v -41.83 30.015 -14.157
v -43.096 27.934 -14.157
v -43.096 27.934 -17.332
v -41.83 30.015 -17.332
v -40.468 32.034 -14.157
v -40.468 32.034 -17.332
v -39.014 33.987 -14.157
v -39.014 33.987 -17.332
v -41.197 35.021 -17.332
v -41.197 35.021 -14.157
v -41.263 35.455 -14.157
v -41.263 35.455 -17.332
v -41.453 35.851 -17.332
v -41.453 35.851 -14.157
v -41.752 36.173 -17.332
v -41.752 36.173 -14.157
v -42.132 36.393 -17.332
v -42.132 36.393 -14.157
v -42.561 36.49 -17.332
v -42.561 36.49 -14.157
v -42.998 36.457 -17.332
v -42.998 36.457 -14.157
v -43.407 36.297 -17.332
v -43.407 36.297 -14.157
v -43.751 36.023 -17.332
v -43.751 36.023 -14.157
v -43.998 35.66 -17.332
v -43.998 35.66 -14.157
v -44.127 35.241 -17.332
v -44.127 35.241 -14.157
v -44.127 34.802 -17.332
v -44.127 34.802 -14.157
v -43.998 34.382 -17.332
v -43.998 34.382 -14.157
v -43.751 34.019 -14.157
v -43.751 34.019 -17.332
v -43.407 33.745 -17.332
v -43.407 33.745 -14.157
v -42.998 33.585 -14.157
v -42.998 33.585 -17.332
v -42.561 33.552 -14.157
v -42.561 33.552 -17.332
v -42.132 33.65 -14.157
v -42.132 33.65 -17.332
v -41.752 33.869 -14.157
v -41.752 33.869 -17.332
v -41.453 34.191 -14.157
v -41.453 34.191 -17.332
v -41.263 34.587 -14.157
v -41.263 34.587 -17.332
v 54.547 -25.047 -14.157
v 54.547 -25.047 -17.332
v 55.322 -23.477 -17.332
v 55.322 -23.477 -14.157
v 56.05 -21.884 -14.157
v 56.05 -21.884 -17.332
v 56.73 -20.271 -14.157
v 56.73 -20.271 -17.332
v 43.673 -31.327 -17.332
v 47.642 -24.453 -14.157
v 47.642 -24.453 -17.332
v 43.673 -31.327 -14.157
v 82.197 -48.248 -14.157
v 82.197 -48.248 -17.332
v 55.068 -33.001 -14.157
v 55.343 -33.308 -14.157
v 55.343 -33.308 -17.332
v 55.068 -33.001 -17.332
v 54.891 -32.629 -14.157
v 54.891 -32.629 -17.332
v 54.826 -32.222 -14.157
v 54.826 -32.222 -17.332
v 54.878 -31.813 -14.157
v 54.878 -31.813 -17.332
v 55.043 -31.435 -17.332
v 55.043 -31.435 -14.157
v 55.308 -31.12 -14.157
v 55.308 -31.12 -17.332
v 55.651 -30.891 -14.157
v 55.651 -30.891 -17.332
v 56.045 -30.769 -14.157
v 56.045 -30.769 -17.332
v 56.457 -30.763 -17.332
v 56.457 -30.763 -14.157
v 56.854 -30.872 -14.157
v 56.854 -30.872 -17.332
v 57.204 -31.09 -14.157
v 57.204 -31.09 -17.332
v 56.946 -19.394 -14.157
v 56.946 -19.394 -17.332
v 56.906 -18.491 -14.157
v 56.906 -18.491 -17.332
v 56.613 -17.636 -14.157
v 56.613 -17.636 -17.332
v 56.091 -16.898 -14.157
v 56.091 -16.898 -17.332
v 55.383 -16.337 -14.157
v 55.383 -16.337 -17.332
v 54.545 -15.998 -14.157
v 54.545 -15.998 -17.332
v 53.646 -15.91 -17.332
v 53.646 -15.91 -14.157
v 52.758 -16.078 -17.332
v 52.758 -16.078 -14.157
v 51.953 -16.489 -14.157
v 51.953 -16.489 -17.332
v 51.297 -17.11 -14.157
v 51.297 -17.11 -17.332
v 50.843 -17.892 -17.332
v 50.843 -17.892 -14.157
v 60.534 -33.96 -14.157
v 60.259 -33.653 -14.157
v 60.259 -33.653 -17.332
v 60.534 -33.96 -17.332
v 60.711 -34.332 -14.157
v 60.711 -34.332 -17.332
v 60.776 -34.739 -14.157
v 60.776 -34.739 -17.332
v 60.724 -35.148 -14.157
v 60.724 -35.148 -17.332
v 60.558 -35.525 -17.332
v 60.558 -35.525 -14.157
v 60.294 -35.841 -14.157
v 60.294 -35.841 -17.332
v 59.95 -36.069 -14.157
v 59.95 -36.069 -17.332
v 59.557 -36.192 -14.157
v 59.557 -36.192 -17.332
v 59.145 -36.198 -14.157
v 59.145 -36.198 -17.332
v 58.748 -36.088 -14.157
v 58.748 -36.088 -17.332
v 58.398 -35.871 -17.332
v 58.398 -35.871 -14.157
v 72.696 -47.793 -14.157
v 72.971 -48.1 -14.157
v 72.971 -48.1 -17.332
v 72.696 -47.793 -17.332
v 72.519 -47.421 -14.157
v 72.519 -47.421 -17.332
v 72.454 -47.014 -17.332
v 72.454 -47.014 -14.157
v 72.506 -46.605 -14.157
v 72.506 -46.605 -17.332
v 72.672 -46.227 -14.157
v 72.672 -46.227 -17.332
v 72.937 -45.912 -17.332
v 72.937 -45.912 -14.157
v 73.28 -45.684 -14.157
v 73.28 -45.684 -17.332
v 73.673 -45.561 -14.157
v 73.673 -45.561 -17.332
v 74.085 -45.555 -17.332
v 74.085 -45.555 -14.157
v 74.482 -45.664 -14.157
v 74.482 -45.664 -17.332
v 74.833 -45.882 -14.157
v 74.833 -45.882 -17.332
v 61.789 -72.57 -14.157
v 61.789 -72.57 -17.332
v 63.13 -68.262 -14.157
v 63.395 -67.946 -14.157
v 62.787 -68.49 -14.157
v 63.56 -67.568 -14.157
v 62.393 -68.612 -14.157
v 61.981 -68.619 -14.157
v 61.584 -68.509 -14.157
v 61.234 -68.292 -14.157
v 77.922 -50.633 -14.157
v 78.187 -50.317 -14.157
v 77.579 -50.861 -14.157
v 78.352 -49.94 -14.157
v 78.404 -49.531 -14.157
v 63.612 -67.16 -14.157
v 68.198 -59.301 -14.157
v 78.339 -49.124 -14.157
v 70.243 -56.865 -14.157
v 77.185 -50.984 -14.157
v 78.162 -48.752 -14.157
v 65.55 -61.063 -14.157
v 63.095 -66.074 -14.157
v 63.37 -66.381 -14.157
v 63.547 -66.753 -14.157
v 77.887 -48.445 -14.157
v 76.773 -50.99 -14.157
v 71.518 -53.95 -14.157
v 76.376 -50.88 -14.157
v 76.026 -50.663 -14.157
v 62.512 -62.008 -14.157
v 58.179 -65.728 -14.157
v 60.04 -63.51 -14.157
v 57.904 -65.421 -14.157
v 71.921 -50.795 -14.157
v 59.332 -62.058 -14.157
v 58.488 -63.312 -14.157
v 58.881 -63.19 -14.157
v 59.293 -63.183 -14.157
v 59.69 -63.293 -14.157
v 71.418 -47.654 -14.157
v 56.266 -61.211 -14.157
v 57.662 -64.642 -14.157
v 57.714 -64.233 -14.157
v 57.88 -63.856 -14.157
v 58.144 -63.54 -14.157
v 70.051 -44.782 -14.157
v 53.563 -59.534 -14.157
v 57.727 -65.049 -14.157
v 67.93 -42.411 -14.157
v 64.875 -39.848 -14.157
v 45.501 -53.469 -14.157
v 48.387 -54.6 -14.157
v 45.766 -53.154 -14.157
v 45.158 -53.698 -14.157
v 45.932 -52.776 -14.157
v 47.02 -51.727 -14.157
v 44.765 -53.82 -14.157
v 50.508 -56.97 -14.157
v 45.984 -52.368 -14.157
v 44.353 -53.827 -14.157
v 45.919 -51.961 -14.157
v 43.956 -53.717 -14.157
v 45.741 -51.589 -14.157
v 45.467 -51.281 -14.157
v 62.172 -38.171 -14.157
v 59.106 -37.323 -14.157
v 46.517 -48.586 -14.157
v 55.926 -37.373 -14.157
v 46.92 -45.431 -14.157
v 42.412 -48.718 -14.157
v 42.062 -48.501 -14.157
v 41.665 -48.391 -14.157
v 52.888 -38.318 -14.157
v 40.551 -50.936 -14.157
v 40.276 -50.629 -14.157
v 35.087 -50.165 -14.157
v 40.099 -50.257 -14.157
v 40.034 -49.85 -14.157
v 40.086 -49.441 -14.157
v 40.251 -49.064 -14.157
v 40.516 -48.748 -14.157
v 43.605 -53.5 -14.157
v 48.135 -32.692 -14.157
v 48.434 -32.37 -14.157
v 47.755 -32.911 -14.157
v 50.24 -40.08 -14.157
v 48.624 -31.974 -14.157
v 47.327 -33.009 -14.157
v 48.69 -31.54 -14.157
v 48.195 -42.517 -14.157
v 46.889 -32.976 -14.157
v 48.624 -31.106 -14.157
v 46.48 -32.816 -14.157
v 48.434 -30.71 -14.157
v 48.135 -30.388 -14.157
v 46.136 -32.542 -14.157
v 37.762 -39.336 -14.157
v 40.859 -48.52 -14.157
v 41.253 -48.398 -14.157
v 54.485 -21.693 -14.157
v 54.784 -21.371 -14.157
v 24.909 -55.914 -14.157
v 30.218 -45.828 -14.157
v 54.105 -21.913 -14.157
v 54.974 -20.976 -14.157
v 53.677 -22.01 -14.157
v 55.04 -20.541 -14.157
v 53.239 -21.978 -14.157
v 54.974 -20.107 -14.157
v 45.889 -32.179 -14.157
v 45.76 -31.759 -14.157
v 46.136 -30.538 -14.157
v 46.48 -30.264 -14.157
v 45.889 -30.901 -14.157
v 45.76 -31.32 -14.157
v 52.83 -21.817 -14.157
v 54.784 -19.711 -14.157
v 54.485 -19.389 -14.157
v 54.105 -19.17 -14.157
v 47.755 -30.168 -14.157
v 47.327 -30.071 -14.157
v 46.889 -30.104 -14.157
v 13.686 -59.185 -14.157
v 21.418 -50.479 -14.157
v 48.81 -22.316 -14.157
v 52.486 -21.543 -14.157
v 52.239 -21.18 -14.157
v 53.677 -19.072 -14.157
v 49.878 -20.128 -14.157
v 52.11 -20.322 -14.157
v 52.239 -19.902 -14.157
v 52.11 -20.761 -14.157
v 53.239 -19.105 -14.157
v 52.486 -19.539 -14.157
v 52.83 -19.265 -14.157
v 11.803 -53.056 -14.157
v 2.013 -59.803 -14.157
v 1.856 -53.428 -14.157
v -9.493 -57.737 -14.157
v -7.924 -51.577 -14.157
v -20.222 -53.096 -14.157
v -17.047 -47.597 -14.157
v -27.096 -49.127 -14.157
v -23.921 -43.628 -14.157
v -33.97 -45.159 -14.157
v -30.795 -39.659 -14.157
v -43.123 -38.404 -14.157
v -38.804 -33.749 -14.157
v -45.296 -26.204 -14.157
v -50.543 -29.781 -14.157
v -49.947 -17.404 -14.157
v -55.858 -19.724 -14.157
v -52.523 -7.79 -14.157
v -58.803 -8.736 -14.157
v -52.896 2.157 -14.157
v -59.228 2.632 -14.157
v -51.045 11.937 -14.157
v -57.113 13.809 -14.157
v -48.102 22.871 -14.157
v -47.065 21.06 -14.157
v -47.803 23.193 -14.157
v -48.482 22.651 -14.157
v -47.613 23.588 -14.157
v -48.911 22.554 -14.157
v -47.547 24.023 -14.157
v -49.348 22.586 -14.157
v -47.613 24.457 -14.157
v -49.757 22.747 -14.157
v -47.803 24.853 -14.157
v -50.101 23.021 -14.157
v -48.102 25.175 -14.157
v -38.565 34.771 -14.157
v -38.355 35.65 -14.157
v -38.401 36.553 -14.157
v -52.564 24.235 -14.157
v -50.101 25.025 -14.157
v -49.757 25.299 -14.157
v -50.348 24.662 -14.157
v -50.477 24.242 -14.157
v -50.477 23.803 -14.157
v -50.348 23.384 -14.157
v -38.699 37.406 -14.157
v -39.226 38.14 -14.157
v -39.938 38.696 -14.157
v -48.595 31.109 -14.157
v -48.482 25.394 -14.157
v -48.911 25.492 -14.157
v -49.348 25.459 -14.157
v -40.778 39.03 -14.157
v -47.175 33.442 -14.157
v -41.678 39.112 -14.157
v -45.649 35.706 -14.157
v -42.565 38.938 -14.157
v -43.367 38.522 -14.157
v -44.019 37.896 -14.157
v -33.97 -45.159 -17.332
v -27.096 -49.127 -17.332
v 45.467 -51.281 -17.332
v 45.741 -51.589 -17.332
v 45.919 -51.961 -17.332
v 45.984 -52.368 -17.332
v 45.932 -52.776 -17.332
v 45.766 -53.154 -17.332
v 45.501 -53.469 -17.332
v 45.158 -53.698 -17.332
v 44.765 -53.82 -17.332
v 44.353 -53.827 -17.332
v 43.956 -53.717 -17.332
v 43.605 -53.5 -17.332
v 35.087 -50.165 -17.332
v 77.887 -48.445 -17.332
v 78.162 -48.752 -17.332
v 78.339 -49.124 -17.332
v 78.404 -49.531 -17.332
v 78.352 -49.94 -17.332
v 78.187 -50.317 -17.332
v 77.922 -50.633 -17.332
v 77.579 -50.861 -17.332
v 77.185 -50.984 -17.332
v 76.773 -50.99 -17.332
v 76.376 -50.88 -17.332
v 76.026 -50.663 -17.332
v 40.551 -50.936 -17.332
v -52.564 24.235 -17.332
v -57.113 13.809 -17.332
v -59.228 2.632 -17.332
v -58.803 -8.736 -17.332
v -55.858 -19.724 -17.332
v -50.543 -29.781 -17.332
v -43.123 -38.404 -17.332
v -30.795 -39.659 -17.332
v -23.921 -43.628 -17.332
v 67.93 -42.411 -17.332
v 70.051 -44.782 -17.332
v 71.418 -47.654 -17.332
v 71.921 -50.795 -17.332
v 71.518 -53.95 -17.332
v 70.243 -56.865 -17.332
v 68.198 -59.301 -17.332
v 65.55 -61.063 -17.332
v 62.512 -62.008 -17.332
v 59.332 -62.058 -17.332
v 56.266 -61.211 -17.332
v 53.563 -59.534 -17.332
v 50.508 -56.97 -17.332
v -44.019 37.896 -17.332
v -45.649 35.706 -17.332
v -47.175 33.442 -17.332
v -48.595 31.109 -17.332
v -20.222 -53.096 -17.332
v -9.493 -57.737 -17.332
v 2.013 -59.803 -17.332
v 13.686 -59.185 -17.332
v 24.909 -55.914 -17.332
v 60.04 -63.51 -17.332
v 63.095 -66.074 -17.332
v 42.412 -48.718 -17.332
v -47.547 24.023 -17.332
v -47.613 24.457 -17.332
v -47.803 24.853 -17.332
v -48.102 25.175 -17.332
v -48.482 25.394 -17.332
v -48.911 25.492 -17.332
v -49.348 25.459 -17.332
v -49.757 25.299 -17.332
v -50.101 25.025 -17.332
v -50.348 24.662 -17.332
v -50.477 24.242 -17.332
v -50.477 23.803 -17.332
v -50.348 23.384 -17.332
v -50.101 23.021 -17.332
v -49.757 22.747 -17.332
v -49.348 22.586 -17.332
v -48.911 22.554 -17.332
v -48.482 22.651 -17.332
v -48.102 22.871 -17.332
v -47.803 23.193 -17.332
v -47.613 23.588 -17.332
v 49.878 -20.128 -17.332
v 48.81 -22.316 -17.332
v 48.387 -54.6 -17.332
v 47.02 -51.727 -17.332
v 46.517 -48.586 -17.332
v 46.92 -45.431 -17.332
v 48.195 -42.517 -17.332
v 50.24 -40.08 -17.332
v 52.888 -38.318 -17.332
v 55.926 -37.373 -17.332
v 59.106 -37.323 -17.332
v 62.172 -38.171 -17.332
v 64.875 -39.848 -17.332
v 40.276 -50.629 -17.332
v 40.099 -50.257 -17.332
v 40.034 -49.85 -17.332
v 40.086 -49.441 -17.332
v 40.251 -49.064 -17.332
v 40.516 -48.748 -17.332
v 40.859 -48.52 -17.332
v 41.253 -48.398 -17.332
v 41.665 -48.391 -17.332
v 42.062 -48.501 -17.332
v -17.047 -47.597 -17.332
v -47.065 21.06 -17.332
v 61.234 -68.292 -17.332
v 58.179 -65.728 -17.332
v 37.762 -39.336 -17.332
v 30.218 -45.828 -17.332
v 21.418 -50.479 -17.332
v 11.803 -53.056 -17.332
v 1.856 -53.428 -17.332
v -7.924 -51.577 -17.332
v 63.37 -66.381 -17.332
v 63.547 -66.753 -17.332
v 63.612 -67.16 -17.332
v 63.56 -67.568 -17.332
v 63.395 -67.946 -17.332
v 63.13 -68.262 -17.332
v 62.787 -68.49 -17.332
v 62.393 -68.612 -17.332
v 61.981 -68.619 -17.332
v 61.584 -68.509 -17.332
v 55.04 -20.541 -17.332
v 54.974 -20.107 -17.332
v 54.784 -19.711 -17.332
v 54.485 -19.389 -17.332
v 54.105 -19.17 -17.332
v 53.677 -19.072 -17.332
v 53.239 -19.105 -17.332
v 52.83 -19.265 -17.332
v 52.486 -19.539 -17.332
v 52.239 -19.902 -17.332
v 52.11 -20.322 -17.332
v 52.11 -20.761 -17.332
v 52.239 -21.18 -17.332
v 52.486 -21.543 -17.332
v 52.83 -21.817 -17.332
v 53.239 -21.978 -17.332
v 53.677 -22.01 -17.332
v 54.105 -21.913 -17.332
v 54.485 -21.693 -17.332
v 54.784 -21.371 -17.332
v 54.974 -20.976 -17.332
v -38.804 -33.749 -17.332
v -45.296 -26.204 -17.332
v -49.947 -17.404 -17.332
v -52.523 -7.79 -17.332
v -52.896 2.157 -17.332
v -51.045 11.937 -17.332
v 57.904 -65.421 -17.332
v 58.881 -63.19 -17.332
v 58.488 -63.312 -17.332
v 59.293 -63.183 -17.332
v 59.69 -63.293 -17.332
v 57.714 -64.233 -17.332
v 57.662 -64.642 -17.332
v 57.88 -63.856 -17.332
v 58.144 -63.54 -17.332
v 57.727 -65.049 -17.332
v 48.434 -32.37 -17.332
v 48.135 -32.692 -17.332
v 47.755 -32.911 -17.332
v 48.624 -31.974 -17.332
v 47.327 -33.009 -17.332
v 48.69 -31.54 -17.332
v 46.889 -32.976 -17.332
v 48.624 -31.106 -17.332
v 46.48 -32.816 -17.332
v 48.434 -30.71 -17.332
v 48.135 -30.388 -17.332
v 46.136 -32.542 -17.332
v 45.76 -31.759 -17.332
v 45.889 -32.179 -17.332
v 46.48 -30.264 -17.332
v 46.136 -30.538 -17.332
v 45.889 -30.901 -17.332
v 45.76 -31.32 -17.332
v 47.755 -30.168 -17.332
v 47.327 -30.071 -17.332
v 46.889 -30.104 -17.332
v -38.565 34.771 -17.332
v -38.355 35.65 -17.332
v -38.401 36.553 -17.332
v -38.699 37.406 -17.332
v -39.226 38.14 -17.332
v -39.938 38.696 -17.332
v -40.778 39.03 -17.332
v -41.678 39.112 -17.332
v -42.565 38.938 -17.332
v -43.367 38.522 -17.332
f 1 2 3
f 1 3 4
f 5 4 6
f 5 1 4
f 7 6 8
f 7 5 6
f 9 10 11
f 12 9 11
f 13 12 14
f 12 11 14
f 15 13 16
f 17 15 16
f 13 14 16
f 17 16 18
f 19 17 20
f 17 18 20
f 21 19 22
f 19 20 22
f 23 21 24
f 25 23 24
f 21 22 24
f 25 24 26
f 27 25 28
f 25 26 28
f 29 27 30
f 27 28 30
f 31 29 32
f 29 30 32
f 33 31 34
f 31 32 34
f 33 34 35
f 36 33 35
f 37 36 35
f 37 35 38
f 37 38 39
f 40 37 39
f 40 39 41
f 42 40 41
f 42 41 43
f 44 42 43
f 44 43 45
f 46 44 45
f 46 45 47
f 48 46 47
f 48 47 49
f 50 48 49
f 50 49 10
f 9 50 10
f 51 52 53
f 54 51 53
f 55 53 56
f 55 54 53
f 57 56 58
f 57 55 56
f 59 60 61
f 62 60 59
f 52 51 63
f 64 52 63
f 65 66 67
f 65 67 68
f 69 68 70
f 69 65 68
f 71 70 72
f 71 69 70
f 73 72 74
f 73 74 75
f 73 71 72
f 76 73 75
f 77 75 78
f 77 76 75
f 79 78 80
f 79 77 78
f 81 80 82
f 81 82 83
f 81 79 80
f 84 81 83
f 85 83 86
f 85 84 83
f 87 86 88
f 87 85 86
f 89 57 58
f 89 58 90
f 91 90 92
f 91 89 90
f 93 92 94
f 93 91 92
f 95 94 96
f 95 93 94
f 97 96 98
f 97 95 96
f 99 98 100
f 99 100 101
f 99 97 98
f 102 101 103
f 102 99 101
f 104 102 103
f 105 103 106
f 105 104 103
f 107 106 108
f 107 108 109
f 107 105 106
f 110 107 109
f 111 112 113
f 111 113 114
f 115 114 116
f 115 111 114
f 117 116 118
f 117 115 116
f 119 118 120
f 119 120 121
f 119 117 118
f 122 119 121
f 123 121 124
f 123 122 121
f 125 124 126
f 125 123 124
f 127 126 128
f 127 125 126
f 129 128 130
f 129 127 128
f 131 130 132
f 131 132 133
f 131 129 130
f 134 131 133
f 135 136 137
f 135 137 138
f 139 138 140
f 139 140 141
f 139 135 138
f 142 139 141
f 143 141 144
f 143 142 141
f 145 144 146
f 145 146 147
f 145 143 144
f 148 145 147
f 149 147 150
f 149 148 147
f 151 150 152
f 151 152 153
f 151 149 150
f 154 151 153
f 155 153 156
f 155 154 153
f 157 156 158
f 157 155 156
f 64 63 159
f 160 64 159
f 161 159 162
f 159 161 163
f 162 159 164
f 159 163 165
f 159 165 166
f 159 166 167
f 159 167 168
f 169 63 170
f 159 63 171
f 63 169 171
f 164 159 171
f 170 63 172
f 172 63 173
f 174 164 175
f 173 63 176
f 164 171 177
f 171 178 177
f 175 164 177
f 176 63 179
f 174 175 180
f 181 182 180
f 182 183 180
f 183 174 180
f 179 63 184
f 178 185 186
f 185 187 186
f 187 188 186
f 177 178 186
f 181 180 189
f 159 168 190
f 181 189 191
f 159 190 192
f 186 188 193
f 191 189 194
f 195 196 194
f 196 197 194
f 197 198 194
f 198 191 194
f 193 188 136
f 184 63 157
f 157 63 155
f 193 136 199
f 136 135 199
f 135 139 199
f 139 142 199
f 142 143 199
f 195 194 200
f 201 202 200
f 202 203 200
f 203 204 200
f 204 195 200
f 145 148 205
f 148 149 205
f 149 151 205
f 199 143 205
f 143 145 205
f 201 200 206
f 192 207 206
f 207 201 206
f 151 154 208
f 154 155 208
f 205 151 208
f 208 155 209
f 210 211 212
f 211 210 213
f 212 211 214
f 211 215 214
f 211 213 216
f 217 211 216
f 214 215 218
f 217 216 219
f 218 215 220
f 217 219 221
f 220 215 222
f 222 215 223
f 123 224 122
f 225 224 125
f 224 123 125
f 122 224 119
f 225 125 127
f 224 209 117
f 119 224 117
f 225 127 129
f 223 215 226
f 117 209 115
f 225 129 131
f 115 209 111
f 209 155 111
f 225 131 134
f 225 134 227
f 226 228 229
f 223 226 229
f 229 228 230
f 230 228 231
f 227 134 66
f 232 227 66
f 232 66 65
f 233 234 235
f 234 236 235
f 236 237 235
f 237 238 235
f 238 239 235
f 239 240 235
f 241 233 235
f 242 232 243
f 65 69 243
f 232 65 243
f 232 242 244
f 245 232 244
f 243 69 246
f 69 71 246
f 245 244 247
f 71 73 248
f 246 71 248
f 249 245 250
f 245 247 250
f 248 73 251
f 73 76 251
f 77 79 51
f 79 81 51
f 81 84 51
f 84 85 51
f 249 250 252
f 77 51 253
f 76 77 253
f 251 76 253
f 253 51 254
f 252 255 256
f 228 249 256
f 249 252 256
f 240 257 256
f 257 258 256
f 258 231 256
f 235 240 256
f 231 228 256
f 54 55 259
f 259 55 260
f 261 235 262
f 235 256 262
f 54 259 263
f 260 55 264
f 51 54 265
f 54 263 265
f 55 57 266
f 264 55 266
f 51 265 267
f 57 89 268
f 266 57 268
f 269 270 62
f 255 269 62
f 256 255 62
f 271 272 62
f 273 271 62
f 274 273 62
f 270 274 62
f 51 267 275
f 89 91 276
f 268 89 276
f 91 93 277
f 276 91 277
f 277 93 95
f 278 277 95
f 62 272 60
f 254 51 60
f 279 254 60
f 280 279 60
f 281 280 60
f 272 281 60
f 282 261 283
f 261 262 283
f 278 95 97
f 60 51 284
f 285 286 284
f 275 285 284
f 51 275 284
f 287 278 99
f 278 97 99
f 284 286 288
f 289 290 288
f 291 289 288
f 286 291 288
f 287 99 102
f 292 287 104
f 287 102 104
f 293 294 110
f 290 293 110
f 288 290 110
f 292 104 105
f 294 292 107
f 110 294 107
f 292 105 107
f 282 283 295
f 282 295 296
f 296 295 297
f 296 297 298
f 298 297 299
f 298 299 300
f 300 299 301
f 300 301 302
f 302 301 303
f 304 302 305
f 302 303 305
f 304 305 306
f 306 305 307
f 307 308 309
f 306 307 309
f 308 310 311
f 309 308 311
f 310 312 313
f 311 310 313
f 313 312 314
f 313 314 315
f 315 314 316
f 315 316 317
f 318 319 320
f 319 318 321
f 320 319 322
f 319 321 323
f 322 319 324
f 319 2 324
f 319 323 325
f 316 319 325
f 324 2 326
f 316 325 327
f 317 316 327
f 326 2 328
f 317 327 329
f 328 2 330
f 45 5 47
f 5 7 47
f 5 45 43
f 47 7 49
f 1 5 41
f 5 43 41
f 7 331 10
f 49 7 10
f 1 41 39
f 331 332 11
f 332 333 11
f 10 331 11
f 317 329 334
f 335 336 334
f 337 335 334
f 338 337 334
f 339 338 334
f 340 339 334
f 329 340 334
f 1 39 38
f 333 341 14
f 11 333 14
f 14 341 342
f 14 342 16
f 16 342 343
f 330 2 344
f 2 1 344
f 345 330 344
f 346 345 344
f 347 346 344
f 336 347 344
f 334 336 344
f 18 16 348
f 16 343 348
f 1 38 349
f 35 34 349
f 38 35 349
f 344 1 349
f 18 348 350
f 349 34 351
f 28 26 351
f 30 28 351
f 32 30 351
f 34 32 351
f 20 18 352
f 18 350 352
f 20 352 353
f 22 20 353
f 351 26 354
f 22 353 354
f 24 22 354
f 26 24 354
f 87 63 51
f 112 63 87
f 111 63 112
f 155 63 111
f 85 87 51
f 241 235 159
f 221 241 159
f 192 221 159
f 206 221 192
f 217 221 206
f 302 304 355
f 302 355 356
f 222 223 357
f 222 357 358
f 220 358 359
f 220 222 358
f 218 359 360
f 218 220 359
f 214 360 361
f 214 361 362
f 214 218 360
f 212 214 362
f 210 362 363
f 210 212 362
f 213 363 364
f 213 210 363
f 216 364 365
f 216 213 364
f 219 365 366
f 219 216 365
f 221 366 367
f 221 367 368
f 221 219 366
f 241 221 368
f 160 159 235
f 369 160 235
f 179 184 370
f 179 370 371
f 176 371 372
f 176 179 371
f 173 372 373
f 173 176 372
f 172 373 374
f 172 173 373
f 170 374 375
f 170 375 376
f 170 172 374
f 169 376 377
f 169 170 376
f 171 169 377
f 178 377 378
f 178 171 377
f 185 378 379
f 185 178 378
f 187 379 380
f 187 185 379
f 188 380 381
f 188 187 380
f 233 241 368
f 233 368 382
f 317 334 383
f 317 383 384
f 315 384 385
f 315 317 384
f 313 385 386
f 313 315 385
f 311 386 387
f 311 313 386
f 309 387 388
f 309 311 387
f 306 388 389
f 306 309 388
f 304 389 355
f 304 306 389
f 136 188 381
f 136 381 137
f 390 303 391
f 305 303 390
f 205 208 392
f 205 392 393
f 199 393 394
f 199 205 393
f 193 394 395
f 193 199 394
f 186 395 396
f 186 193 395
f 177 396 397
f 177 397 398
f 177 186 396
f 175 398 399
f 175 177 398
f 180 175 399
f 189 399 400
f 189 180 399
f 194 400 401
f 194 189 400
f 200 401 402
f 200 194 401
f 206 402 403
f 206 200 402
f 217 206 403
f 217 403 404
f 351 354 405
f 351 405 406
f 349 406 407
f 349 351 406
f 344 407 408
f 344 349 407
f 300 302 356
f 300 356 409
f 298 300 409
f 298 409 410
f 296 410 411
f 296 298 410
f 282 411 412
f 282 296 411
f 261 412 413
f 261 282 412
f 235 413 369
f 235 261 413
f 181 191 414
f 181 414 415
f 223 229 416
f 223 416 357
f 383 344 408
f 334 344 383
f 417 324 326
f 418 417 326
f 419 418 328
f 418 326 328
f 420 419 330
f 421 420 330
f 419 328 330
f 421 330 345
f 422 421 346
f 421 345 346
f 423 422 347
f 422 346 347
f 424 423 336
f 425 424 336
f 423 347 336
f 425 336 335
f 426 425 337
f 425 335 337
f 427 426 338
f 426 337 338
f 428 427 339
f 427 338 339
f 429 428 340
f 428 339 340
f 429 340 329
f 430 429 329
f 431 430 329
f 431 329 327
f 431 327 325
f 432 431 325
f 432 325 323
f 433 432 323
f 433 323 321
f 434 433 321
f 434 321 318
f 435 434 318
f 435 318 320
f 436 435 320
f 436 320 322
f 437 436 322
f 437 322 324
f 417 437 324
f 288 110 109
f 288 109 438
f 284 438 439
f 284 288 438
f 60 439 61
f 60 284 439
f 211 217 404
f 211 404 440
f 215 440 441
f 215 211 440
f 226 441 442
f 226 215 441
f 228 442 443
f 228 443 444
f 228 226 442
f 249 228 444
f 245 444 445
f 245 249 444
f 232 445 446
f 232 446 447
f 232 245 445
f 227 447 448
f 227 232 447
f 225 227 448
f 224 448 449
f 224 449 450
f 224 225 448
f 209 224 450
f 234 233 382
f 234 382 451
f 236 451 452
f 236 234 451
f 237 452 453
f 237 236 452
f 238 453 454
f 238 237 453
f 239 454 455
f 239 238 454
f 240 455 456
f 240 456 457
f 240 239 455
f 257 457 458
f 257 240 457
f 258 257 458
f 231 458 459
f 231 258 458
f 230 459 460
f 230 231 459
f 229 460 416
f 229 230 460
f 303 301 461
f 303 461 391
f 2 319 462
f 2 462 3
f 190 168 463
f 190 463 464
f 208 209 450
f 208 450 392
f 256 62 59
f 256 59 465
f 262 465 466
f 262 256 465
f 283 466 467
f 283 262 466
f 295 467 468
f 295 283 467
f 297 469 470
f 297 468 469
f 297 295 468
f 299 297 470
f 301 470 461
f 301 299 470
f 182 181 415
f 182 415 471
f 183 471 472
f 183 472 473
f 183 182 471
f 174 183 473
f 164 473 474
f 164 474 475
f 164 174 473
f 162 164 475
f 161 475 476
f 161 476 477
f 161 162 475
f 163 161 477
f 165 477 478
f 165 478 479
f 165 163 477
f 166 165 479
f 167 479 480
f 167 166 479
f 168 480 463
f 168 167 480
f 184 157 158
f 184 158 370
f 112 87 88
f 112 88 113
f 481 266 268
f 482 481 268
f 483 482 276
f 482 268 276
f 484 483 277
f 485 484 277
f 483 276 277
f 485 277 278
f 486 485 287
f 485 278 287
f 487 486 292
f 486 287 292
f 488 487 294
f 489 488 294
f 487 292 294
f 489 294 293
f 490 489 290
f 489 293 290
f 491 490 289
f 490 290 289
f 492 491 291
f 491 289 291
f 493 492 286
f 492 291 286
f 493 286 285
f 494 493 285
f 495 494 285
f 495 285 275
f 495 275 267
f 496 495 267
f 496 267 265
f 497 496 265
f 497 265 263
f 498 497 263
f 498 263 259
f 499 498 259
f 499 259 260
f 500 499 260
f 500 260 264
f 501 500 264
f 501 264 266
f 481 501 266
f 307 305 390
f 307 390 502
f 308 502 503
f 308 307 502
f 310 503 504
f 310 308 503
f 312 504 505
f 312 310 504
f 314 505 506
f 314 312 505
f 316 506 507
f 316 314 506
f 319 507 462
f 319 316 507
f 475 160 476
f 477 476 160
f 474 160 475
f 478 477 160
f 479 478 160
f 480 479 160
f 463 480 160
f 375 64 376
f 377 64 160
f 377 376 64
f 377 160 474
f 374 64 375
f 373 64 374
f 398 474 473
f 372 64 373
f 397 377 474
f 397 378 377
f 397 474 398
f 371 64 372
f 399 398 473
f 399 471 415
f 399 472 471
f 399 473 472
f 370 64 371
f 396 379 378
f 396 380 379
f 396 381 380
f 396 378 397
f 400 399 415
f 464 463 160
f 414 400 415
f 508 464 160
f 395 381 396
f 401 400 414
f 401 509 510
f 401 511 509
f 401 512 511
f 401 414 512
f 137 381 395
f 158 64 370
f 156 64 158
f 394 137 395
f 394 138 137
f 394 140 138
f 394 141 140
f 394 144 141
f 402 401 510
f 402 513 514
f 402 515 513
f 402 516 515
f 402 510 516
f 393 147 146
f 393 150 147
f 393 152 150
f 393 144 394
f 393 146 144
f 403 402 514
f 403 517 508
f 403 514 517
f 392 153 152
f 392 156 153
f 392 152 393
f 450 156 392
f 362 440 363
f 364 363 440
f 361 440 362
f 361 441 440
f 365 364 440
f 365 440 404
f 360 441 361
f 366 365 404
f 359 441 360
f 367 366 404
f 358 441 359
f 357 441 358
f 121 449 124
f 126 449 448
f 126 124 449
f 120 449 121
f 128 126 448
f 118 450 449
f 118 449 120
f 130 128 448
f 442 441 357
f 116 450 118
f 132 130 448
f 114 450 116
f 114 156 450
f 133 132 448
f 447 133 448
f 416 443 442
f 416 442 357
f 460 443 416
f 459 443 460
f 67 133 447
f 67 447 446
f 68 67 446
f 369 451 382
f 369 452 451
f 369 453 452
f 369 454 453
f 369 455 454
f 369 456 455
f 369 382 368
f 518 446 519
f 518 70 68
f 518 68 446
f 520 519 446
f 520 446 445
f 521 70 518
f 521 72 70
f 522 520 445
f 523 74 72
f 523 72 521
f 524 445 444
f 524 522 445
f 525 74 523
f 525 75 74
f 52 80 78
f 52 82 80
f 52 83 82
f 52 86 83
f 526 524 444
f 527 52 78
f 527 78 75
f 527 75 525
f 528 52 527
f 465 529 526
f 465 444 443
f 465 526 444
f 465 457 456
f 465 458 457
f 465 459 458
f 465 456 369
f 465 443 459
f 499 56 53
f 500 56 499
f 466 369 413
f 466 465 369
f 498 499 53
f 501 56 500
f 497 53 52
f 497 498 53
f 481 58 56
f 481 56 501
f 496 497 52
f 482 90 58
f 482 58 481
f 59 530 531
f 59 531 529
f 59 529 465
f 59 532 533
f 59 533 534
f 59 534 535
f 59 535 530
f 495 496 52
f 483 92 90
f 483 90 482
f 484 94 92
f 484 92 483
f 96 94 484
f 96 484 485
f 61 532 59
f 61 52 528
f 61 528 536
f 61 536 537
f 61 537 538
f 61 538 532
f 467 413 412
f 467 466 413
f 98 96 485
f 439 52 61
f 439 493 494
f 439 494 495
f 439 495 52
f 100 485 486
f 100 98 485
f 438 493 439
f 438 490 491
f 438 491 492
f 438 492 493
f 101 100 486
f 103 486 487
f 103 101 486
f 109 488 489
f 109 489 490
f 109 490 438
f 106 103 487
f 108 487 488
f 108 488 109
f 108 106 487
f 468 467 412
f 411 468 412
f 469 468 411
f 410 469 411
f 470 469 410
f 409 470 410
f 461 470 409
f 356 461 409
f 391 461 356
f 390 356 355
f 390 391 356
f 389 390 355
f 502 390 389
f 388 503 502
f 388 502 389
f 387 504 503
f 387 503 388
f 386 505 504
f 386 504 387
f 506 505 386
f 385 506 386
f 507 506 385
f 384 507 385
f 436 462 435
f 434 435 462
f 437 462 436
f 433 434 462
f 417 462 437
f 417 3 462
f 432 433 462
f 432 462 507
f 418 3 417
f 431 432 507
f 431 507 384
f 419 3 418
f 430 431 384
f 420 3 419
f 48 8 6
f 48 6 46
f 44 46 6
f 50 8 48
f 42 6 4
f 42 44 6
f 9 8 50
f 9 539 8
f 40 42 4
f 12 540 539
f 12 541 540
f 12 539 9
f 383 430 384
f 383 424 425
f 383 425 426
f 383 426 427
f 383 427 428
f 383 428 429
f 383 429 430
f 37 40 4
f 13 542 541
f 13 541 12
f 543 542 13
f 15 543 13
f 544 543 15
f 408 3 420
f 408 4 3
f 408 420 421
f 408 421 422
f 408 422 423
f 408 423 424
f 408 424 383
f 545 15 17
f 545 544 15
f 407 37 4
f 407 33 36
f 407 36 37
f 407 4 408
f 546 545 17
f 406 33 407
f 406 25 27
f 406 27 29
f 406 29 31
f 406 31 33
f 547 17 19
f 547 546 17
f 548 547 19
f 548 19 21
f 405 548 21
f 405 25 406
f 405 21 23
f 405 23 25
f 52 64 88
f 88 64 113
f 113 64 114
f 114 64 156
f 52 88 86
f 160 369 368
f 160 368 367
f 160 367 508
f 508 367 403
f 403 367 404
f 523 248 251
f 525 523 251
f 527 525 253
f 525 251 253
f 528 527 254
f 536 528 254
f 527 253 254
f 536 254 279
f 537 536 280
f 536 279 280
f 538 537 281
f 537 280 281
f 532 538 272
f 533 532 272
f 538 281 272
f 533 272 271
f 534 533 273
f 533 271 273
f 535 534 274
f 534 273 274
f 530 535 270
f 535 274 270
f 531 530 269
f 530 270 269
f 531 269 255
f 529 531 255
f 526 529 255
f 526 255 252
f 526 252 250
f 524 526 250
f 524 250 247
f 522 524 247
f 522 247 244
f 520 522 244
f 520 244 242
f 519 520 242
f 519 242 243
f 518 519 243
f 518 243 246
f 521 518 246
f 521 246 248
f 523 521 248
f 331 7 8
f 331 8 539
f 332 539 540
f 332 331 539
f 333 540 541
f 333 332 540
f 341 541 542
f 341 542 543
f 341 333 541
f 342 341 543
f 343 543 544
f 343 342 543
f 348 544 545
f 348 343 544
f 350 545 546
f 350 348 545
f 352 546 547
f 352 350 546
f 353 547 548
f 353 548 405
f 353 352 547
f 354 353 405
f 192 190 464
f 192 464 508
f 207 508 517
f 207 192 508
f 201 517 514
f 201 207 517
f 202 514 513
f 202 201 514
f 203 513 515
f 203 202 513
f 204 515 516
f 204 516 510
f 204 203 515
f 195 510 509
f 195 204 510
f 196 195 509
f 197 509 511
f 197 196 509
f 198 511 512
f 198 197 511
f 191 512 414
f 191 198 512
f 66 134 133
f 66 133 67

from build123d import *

# Parameters (mm, degrees)
BOSS_EXTRUDE1_DEPTH   = 3.175
BOSS_EXTRUDE2_DEPTH   = 3.175
F_4_CLEARANCE_HOLE1_D = 2.9464


with BuildPart() as part:
    # Sketch1 → Boss-Extrude1 (new body)
    with BuildSketch(Plane(origin=(0, 0, -14.15699402), x_dir=(-1, 0, 0), z_dir=(0, 0, -1))):
        with BuildLine():
            Line((-49.172312317, -34.502108483), (-53.141062317, -27.628031841))
            ThreePointArc((-53.141062317, -27.628031841), (-55.063803638, -24.012221257), (-56.72992661, -20.271224785))
            ThreePointArc((-56.72992661, -20.271224785), (-54.976138042, -16.13776671), (-50.842679967, -17.891555277))
            ThreePointArc((-50.842679967, -17.891555277), (-49.356678398, -21.228119699), (-47.641801003, -24.453031841))
            Line((-47.641801003, -24.453031841), (-43.673051003, -31.327108483))
            ThreePointArc((-43.673051003, -31.327108483), (-16.68272836, -52.037511462), (17.046778195, -47.596937682))
            Line((17.046778195, -47.596937682), (23.920854837, -43.628187682))
            Line((23.920854837, -43.628187682), (30.79493148, -39.659437682))
            ThreePointArc((30.79493148, -39.659437682), (51.505334458, -12.669115038), (47.064760678, 21.060391517))
            Line((47.064760678, 21.060391517), (43.096010678, 27.934468159))
            ThreePointArc((43.096010678, 27.934468159), (41.160593535, 31.032051618), (39.01404477, 33.987248938))
            ThreePointArc((39.01404477, 33.987248938), (39.561948355, 38.44382292), (44.018522337, 37.895919335))
            ThreePointArc((44.018522337, 37.895919335), (46.425258832, 34.58251628), (48.595271992, 31.109468159))
            Line((48.595271992, 31.109468159), (52.564021992, 24.235391517))
            ThreePointArc((52.564021992, 24.235391517), (57.638963455, -14.312615975), (33.96993148, -45.158698996))
            Line((33.96993148, -45.158698996), (27.095854837, -49.127448996))
            Line((27.095854837, -49.127448996), (20.221778195, -53.096198996))
            ThreePointArc((20.221778195, -53.096198996), (-18.326229296, -58.171140459), (-49.172312317, -34.502108483))
        make_face()
    extrude(amount=BOSS_EXTRUDE1_DEPTH)

    # Sketch6 → Boss-Extrude2 (add)
    with BuildSketch(Plane.XY.offset(-14.15699402)):
        Polygon((82.197110068, -48.248224024), (61.788603461, -72.570135093), (31.367040987, -47.043413242), (51.775547595, -22.721502173), align=None)
        with BuildLine():
            Line((64.875367382, -39.847664977), (67.930199412, -42.410973407))
            ThreePointArc((67.930199412, -42.410973407), (69.307717782, -58.156080429), (53.56261076, -59.533598799))
            Line((53.56261076, -59.533598799), (50.50777873, -56.970290369))
            ThreePointArc((50.50777873, -56.970290369), (49.130260359, -41.225183347), (64.875367382, -39.847664977))
        make_face(mode=Mode.SUBTRACT)
        with BuildLine():
            Line((61.233994962, -68.291668614), (58.179162931, -65.728360184))
            ThreePointArc((58.179162931, -65.728360184), (58.000711688, -63.688653138), (60.040418734, -63.510201894))
            Line((60.040418734, -63.510201894), (63.095250764, -66.073510324))
            ThreePointArc((63.095250764, -66.073510324), (63.273702008, -68.11321737), (61.233994962, -68.291668614))
        make_face(mode=Mode.SUBTRACT)
        with BuildLine():
            Line((42.411897591, -48.718116305), (45.466729621, -51.281424735))
            ThreePointArc((45.466729621, -51.281424735), (45.645180865, -53.321131781), (43.605473819, -53.499583025))
            Line((43.605473819, -53.499583025), (40.550641788, -50.936274595))
            ThreePointArc((40.550641788, -50.936274595), (40.372190545, -48.896567549), (42.411897591, -48.718116305))
        make_face(mode=Mode.SUBTRACT)
        with BuildLine():
            Line((57.20398318, -31.089595162), (60.25881521, -33.652903592))
            ThreePointArc((60.25881521, -33.652903592), (60.437266454, -35.692610638), (58.397559408, -35.871061882))
            Line((58.397559408, -35.871061882), (55.342727378, -33.307753452))
            ThreePointArc((55.342727378, -33.307753452), (55.164276134, -31.268046406), (57.20398318, -31.089595162))
        make_face(mode=Mode.SUBTRACT)
        with BuildLine():
            Line((74.832504323, -45.881680752), (77.887336353, -48.444989181))
            ThreePointArc((77.887336353, -48.444989181), (78.065787597, -50.484696227), (76.026080551, -50.663147471))
            Line((76.026080551, -50.663147471), (72.97124852, -48.099839041))
            ThreePointArc((72.97124852, -48.099839041), (72.792797277, -46.060131995), (74.832504323, -45.881680752))
        make_face(mode=Mode.SUBTRACT)
    extrude(amount=-BOSS_EXTRUDE2_DEPTH)

    # #4 Clearance Hole1 (through all)
    with Locations(Plane(origin=(0, 0, -17.33199402), x_dir=(-1, 0, 0), z_dir=(0, 0, -1))):
        with Locations((-53.56643166, -20.541270527), (-47.21643166, -31.539793155), (42.670641335, 35.021229473), (49.020641335, 24.022706845)):
            Hole(F_4_CLEARANCE_HOLE1_D / 2)


solid = part.part
